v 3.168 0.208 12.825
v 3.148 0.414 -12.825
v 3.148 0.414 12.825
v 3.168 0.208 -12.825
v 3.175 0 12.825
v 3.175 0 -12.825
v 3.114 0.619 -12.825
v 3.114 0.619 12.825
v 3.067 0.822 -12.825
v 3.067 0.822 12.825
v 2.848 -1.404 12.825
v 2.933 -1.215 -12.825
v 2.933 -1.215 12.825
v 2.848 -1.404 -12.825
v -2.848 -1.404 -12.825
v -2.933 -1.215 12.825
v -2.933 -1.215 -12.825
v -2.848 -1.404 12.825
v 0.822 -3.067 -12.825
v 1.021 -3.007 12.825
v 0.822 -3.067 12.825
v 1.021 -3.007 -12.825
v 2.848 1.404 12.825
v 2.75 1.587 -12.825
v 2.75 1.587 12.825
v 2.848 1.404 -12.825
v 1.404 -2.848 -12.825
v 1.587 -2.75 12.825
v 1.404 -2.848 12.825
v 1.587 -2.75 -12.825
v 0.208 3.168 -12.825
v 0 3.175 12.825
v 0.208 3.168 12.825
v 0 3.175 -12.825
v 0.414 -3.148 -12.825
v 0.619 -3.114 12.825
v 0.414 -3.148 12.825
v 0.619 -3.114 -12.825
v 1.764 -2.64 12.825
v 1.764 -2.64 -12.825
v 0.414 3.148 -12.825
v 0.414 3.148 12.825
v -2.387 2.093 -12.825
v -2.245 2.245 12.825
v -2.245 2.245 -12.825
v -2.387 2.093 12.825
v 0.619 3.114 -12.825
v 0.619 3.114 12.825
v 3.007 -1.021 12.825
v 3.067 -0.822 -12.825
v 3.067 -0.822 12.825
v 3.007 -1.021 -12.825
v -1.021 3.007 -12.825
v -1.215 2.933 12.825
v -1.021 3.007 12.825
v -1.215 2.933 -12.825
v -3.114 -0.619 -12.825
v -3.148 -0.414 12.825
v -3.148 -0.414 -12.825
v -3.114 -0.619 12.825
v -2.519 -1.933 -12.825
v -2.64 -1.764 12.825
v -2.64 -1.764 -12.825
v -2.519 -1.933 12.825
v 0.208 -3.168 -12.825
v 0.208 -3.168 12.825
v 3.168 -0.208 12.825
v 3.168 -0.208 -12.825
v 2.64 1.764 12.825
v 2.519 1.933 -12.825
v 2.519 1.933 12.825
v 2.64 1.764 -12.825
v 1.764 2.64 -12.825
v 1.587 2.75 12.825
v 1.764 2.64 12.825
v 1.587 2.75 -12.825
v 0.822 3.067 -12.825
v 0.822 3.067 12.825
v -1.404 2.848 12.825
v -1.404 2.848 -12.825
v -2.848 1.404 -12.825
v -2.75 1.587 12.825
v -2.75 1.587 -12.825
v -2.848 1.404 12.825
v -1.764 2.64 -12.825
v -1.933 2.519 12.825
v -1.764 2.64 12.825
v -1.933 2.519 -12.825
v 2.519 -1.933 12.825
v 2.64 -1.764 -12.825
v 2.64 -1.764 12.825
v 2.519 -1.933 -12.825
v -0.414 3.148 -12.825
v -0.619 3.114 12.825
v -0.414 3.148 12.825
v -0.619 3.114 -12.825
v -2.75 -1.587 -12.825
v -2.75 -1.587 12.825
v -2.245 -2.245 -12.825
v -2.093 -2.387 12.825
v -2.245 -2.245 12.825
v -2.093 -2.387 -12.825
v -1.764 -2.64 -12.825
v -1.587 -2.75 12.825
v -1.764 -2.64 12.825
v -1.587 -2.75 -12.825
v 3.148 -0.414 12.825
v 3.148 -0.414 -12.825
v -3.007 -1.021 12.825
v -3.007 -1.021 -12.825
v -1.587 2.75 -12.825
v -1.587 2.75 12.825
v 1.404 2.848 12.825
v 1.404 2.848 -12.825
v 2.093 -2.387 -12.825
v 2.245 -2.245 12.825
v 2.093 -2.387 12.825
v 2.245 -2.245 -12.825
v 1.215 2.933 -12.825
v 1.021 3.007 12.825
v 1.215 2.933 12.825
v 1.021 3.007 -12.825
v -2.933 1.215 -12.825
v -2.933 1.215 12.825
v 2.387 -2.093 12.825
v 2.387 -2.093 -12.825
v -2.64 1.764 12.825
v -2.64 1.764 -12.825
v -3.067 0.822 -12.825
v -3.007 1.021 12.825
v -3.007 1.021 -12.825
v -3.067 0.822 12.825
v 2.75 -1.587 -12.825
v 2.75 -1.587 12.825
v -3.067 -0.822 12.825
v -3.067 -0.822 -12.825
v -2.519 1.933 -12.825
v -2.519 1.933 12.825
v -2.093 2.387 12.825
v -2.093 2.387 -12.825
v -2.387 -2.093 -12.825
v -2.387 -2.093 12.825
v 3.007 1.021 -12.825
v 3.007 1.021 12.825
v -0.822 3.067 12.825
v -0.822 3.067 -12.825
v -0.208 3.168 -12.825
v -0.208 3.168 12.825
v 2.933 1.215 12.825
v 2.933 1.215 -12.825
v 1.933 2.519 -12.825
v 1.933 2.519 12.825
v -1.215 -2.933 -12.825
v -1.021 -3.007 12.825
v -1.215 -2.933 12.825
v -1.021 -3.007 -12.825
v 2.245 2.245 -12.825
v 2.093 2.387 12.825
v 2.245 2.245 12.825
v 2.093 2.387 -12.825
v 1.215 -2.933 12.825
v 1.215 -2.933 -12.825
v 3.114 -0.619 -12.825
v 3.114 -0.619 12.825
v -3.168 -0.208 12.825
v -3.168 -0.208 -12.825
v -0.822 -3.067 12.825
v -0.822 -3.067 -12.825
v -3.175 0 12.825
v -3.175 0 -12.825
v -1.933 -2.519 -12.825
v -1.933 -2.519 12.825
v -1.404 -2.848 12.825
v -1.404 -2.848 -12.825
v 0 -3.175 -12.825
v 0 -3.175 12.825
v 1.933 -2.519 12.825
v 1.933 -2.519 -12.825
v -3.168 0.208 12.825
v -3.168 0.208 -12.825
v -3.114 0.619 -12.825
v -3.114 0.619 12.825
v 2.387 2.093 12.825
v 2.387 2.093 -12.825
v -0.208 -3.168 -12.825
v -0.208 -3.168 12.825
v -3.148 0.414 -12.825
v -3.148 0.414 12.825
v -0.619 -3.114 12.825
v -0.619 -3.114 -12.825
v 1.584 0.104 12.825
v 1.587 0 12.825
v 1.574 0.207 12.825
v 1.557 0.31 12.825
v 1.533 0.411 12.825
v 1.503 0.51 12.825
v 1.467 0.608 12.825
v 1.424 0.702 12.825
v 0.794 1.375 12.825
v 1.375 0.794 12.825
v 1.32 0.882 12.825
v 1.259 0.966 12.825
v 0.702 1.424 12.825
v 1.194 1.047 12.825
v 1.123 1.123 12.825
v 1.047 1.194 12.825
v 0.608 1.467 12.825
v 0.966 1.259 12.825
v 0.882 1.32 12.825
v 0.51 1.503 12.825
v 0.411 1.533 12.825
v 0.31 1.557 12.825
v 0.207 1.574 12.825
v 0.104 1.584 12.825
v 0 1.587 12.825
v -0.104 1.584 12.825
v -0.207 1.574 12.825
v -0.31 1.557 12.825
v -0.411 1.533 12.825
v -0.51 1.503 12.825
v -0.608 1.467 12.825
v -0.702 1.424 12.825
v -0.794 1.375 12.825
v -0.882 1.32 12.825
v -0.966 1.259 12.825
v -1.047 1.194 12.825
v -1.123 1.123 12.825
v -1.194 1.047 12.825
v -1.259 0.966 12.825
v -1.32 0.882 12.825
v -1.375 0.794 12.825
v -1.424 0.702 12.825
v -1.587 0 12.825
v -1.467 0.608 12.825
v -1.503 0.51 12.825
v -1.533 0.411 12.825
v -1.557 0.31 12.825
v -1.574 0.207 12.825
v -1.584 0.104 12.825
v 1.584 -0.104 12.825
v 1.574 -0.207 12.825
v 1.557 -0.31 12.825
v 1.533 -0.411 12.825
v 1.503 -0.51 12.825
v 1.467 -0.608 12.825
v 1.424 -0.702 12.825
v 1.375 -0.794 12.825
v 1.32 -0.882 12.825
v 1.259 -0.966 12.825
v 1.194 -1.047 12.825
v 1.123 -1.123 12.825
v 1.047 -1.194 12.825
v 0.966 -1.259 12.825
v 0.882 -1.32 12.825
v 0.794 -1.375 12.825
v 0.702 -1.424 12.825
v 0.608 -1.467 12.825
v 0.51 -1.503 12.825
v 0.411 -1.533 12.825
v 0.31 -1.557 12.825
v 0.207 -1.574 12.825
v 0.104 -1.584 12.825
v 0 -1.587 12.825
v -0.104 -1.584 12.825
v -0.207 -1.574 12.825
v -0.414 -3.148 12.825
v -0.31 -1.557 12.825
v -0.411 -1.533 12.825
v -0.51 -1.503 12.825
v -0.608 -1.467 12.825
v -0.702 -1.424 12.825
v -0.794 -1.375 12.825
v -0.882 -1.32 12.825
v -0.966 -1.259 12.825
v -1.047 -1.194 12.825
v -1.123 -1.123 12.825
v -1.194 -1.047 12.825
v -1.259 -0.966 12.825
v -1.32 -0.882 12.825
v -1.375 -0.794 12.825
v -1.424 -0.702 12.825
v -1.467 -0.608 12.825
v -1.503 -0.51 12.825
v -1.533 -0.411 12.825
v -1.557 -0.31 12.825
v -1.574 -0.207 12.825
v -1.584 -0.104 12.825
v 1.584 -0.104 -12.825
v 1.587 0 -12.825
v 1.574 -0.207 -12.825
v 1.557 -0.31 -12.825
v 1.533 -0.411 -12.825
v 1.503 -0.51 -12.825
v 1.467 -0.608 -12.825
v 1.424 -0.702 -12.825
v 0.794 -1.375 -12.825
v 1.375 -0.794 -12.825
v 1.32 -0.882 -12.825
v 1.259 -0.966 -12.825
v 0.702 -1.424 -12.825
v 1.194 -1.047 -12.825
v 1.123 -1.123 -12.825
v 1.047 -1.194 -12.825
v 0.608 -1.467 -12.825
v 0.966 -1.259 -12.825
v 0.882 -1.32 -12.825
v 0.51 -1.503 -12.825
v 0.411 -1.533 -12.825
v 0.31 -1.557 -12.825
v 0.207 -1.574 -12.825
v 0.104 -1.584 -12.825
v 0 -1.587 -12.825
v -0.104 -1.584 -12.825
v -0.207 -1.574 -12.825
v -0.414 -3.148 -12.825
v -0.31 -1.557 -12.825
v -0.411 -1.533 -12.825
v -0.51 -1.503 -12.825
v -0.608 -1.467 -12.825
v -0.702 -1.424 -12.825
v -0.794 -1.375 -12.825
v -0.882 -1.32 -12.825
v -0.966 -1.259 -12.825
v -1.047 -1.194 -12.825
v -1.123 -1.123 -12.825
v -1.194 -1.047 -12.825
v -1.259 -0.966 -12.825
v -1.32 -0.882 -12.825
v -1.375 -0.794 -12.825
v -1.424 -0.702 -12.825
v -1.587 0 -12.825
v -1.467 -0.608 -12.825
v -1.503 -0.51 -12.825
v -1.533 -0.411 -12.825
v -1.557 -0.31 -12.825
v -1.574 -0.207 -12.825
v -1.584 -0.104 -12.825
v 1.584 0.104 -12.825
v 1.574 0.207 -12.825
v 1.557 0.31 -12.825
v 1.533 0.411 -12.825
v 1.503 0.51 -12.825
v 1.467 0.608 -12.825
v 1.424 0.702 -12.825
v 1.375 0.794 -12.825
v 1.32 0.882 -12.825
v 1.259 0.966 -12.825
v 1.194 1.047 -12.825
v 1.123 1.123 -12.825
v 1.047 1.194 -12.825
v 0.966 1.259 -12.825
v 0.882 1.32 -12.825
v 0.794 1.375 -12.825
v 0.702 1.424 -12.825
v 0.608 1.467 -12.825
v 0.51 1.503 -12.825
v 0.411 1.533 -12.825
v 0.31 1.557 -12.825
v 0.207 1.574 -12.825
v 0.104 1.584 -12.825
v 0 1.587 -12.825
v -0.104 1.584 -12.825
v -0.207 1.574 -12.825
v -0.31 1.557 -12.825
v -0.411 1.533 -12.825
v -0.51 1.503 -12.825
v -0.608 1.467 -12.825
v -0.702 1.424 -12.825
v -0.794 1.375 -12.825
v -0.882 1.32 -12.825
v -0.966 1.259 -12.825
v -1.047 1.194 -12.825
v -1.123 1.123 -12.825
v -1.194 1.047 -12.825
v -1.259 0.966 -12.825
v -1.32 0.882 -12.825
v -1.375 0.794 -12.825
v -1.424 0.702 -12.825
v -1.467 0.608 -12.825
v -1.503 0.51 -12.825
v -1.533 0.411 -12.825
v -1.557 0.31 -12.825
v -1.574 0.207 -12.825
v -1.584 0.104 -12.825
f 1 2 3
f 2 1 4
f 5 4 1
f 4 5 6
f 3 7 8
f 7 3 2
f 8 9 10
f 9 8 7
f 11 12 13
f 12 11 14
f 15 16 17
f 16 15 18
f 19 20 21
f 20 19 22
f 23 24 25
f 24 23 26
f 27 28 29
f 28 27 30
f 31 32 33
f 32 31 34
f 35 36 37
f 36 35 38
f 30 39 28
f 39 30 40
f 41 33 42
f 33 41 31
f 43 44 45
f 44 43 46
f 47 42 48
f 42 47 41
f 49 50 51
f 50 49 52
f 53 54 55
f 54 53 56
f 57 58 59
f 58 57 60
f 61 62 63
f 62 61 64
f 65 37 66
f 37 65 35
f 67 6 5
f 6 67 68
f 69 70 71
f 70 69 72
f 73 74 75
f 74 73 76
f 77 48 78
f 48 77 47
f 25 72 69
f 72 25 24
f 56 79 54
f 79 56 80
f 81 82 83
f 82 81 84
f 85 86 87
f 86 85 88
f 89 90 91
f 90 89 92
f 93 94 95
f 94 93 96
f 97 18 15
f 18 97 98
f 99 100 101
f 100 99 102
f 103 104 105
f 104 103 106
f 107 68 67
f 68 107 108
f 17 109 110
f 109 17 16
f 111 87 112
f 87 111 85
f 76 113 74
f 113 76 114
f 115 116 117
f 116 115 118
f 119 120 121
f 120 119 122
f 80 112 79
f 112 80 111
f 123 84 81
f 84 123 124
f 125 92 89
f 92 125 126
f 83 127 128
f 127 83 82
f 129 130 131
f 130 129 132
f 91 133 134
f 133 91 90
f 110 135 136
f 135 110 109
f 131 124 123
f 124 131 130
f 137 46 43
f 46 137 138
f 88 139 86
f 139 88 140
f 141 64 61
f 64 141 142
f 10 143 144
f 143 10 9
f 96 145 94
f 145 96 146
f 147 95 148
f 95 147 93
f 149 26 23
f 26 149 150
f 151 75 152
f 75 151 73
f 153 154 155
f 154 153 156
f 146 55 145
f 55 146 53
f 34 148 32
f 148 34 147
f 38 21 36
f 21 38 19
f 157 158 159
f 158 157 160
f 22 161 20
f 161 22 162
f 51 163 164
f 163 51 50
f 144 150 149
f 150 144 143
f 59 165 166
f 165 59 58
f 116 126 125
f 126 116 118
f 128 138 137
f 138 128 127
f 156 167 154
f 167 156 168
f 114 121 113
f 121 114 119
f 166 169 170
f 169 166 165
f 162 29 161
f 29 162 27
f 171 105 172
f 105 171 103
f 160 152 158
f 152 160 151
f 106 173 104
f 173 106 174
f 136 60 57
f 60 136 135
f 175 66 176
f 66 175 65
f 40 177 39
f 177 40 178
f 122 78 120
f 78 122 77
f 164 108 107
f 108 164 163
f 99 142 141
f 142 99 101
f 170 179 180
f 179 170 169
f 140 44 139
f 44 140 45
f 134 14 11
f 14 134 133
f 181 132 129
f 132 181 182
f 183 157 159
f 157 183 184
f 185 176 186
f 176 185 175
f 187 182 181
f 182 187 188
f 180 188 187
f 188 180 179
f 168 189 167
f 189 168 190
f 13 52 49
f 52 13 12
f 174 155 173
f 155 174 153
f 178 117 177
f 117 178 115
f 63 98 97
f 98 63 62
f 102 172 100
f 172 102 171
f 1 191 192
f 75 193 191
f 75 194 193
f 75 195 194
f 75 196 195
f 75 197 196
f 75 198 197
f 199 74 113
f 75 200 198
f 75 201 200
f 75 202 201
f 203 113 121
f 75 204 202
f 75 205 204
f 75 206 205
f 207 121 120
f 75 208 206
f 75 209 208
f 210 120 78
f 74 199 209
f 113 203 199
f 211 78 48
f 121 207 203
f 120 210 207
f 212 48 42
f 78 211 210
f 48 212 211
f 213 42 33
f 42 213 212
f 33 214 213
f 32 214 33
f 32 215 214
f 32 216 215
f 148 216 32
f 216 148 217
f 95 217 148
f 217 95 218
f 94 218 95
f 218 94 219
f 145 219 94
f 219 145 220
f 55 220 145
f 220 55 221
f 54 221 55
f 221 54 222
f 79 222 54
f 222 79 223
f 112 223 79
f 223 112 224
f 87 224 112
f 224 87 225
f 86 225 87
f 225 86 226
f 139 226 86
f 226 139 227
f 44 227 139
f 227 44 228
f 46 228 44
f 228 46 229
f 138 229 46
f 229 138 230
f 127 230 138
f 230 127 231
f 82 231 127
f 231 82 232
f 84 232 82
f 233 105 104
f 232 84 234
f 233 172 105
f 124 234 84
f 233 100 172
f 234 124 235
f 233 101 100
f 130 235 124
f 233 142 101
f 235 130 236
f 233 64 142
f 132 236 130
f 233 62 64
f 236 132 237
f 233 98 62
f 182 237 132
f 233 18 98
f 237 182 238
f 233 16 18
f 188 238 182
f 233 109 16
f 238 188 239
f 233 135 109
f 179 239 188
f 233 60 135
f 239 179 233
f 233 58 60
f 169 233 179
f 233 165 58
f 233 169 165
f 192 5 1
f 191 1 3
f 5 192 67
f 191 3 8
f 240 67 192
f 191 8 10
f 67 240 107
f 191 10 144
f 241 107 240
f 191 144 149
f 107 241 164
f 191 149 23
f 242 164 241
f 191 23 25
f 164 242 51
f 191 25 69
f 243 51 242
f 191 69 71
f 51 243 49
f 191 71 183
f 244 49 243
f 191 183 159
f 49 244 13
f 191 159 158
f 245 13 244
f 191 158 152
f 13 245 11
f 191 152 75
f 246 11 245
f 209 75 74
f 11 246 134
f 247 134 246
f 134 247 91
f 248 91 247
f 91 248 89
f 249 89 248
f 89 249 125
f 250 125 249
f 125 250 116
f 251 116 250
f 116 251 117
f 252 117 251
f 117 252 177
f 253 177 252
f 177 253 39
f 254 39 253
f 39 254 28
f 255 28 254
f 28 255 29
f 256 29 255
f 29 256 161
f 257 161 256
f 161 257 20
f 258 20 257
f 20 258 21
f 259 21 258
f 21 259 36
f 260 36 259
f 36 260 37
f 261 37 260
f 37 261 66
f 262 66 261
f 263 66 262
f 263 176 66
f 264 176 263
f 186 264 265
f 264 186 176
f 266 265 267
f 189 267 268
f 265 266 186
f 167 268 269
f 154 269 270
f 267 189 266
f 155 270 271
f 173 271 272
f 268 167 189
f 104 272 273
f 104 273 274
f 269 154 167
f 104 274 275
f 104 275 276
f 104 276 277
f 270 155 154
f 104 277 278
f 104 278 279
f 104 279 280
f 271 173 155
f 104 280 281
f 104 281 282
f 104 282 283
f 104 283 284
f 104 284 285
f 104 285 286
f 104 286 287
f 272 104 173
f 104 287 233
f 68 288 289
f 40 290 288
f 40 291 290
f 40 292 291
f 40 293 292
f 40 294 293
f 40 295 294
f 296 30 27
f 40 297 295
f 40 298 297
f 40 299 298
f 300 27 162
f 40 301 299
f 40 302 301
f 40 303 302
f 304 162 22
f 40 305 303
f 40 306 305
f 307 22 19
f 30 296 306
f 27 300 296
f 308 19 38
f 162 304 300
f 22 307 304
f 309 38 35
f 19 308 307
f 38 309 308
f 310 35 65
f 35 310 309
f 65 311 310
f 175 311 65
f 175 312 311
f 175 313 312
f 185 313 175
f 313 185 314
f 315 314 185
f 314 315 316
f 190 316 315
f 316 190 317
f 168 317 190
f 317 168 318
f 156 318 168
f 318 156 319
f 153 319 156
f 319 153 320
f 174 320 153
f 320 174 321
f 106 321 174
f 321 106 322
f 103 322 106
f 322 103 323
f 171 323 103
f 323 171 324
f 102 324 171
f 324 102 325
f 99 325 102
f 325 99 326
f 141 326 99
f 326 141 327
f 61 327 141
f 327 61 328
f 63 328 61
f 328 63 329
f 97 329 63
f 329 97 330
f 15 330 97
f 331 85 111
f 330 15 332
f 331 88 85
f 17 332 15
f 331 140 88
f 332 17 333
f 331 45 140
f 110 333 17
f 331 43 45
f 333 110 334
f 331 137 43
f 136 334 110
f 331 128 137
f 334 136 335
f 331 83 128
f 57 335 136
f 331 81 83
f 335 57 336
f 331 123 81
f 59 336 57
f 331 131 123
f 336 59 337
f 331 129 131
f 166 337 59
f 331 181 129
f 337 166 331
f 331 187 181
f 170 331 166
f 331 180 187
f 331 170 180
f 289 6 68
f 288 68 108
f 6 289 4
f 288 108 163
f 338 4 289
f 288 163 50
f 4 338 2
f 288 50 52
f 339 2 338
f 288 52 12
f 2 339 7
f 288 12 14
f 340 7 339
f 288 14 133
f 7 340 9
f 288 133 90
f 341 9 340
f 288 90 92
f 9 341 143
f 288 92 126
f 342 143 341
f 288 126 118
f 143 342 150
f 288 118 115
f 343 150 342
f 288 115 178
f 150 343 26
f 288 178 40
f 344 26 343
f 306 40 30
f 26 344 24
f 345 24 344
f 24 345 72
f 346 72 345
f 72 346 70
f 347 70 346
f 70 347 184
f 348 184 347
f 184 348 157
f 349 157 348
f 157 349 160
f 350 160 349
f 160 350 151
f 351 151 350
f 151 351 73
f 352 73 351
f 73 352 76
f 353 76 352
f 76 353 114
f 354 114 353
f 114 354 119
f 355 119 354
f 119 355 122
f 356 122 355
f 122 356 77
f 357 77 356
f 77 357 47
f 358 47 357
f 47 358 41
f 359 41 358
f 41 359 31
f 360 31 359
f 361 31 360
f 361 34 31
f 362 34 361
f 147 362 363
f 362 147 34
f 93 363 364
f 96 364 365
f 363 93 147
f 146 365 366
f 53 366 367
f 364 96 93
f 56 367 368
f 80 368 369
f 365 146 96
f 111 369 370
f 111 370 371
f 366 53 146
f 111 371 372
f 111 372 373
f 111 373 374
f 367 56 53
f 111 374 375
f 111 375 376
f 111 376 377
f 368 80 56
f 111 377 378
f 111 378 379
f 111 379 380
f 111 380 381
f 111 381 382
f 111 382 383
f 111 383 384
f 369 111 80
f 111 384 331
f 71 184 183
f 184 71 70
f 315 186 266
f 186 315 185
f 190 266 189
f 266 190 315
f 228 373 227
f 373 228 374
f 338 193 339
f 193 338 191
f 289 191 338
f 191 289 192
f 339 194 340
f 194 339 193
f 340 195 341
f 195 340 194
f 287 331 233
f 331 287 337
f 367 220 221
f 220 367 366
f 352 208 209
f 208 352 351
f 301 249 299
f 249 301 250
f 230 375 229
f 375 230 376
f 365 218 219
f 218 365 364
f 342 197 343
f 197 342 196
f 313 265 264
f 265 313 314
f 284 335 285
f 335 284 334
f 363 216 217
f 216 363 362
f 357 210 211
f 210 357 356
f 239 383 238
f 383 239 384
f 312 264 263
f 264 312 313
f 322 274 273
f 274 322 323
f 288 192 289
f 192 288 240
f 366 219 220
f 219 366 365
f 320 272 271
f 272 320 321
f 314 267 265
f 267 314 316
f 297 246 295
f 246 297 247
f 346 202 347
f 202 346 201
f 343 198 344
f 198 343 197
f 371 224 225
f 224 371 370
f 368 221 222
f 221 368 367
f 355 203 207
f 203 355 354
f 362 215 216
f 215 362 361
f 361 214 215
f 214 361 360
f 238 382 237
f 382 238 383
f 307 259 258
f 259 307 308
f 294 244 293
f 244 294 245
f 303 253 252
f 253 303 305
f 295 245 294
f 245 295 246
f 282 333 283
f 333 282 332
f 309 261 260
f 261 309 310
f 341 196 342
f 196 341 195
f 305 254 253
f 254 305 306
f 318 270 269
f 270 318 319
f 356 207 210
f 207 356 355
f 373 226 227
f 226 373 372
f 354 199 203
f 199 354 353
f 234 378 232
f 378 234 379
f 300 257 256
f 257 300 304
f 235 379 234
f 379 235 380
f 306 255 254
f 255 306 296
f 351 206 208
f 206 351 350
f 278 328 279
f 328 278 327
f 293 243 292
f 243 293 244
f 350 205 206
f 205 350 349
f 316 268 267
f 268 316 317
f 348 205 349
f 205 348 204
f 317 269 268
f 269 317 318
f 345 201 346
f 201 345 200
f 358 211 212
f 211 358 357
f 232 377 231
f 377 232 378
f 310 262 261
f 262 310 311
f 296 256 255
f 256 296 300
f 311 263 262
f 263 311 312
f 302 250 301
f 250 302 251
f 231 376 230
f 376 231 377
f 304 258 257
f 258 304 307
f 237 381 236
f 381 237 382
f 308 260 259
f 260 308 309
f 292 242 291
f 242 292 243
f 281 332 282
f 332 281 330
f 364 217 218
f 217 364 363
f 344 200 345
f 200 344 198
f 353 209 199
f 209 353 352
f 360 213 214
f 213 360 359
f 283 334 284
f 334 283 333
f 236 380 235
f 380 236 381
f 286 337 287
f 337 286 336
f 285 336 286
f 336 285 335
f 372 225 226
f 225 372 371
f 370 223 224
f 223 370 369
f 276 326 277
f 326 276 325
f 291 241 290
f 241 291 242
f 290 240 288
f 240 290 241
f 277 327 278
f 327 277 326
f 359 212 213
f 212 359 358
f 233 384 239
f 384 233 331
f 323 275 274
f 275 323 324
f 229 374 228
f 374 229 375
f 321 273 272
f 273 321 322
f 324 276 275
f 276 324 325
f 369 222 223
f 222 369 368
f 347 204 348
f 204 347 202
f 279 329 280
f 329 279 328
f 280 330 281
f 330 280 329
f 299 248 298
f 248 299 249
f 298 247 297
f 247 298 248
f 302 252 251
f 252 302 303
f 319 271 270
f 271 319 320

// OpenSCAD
// Simple hollow cylindrical sleeve (tube/spacer) with concentric through-bore
// Bounding box: 6.3 x 6.3 x 25.7 mm (approx from OD and L)

OD = 6.35;      // outer diameter (mm)
ID = 3.175;     // inner diameter (mm)
L  = 25.65;     // length/height (mm)

overlap = 0.2;  // ensures clean through-cut

$fn = 96;

module sleeve(od, id, h) {
    difference() {
        cylinder(h=h, r=od/2, center=true);
        cylinder(h=h + 2*overlap, r=id/2, center=true);
    }
}

sleeve(OD, ID, L);
